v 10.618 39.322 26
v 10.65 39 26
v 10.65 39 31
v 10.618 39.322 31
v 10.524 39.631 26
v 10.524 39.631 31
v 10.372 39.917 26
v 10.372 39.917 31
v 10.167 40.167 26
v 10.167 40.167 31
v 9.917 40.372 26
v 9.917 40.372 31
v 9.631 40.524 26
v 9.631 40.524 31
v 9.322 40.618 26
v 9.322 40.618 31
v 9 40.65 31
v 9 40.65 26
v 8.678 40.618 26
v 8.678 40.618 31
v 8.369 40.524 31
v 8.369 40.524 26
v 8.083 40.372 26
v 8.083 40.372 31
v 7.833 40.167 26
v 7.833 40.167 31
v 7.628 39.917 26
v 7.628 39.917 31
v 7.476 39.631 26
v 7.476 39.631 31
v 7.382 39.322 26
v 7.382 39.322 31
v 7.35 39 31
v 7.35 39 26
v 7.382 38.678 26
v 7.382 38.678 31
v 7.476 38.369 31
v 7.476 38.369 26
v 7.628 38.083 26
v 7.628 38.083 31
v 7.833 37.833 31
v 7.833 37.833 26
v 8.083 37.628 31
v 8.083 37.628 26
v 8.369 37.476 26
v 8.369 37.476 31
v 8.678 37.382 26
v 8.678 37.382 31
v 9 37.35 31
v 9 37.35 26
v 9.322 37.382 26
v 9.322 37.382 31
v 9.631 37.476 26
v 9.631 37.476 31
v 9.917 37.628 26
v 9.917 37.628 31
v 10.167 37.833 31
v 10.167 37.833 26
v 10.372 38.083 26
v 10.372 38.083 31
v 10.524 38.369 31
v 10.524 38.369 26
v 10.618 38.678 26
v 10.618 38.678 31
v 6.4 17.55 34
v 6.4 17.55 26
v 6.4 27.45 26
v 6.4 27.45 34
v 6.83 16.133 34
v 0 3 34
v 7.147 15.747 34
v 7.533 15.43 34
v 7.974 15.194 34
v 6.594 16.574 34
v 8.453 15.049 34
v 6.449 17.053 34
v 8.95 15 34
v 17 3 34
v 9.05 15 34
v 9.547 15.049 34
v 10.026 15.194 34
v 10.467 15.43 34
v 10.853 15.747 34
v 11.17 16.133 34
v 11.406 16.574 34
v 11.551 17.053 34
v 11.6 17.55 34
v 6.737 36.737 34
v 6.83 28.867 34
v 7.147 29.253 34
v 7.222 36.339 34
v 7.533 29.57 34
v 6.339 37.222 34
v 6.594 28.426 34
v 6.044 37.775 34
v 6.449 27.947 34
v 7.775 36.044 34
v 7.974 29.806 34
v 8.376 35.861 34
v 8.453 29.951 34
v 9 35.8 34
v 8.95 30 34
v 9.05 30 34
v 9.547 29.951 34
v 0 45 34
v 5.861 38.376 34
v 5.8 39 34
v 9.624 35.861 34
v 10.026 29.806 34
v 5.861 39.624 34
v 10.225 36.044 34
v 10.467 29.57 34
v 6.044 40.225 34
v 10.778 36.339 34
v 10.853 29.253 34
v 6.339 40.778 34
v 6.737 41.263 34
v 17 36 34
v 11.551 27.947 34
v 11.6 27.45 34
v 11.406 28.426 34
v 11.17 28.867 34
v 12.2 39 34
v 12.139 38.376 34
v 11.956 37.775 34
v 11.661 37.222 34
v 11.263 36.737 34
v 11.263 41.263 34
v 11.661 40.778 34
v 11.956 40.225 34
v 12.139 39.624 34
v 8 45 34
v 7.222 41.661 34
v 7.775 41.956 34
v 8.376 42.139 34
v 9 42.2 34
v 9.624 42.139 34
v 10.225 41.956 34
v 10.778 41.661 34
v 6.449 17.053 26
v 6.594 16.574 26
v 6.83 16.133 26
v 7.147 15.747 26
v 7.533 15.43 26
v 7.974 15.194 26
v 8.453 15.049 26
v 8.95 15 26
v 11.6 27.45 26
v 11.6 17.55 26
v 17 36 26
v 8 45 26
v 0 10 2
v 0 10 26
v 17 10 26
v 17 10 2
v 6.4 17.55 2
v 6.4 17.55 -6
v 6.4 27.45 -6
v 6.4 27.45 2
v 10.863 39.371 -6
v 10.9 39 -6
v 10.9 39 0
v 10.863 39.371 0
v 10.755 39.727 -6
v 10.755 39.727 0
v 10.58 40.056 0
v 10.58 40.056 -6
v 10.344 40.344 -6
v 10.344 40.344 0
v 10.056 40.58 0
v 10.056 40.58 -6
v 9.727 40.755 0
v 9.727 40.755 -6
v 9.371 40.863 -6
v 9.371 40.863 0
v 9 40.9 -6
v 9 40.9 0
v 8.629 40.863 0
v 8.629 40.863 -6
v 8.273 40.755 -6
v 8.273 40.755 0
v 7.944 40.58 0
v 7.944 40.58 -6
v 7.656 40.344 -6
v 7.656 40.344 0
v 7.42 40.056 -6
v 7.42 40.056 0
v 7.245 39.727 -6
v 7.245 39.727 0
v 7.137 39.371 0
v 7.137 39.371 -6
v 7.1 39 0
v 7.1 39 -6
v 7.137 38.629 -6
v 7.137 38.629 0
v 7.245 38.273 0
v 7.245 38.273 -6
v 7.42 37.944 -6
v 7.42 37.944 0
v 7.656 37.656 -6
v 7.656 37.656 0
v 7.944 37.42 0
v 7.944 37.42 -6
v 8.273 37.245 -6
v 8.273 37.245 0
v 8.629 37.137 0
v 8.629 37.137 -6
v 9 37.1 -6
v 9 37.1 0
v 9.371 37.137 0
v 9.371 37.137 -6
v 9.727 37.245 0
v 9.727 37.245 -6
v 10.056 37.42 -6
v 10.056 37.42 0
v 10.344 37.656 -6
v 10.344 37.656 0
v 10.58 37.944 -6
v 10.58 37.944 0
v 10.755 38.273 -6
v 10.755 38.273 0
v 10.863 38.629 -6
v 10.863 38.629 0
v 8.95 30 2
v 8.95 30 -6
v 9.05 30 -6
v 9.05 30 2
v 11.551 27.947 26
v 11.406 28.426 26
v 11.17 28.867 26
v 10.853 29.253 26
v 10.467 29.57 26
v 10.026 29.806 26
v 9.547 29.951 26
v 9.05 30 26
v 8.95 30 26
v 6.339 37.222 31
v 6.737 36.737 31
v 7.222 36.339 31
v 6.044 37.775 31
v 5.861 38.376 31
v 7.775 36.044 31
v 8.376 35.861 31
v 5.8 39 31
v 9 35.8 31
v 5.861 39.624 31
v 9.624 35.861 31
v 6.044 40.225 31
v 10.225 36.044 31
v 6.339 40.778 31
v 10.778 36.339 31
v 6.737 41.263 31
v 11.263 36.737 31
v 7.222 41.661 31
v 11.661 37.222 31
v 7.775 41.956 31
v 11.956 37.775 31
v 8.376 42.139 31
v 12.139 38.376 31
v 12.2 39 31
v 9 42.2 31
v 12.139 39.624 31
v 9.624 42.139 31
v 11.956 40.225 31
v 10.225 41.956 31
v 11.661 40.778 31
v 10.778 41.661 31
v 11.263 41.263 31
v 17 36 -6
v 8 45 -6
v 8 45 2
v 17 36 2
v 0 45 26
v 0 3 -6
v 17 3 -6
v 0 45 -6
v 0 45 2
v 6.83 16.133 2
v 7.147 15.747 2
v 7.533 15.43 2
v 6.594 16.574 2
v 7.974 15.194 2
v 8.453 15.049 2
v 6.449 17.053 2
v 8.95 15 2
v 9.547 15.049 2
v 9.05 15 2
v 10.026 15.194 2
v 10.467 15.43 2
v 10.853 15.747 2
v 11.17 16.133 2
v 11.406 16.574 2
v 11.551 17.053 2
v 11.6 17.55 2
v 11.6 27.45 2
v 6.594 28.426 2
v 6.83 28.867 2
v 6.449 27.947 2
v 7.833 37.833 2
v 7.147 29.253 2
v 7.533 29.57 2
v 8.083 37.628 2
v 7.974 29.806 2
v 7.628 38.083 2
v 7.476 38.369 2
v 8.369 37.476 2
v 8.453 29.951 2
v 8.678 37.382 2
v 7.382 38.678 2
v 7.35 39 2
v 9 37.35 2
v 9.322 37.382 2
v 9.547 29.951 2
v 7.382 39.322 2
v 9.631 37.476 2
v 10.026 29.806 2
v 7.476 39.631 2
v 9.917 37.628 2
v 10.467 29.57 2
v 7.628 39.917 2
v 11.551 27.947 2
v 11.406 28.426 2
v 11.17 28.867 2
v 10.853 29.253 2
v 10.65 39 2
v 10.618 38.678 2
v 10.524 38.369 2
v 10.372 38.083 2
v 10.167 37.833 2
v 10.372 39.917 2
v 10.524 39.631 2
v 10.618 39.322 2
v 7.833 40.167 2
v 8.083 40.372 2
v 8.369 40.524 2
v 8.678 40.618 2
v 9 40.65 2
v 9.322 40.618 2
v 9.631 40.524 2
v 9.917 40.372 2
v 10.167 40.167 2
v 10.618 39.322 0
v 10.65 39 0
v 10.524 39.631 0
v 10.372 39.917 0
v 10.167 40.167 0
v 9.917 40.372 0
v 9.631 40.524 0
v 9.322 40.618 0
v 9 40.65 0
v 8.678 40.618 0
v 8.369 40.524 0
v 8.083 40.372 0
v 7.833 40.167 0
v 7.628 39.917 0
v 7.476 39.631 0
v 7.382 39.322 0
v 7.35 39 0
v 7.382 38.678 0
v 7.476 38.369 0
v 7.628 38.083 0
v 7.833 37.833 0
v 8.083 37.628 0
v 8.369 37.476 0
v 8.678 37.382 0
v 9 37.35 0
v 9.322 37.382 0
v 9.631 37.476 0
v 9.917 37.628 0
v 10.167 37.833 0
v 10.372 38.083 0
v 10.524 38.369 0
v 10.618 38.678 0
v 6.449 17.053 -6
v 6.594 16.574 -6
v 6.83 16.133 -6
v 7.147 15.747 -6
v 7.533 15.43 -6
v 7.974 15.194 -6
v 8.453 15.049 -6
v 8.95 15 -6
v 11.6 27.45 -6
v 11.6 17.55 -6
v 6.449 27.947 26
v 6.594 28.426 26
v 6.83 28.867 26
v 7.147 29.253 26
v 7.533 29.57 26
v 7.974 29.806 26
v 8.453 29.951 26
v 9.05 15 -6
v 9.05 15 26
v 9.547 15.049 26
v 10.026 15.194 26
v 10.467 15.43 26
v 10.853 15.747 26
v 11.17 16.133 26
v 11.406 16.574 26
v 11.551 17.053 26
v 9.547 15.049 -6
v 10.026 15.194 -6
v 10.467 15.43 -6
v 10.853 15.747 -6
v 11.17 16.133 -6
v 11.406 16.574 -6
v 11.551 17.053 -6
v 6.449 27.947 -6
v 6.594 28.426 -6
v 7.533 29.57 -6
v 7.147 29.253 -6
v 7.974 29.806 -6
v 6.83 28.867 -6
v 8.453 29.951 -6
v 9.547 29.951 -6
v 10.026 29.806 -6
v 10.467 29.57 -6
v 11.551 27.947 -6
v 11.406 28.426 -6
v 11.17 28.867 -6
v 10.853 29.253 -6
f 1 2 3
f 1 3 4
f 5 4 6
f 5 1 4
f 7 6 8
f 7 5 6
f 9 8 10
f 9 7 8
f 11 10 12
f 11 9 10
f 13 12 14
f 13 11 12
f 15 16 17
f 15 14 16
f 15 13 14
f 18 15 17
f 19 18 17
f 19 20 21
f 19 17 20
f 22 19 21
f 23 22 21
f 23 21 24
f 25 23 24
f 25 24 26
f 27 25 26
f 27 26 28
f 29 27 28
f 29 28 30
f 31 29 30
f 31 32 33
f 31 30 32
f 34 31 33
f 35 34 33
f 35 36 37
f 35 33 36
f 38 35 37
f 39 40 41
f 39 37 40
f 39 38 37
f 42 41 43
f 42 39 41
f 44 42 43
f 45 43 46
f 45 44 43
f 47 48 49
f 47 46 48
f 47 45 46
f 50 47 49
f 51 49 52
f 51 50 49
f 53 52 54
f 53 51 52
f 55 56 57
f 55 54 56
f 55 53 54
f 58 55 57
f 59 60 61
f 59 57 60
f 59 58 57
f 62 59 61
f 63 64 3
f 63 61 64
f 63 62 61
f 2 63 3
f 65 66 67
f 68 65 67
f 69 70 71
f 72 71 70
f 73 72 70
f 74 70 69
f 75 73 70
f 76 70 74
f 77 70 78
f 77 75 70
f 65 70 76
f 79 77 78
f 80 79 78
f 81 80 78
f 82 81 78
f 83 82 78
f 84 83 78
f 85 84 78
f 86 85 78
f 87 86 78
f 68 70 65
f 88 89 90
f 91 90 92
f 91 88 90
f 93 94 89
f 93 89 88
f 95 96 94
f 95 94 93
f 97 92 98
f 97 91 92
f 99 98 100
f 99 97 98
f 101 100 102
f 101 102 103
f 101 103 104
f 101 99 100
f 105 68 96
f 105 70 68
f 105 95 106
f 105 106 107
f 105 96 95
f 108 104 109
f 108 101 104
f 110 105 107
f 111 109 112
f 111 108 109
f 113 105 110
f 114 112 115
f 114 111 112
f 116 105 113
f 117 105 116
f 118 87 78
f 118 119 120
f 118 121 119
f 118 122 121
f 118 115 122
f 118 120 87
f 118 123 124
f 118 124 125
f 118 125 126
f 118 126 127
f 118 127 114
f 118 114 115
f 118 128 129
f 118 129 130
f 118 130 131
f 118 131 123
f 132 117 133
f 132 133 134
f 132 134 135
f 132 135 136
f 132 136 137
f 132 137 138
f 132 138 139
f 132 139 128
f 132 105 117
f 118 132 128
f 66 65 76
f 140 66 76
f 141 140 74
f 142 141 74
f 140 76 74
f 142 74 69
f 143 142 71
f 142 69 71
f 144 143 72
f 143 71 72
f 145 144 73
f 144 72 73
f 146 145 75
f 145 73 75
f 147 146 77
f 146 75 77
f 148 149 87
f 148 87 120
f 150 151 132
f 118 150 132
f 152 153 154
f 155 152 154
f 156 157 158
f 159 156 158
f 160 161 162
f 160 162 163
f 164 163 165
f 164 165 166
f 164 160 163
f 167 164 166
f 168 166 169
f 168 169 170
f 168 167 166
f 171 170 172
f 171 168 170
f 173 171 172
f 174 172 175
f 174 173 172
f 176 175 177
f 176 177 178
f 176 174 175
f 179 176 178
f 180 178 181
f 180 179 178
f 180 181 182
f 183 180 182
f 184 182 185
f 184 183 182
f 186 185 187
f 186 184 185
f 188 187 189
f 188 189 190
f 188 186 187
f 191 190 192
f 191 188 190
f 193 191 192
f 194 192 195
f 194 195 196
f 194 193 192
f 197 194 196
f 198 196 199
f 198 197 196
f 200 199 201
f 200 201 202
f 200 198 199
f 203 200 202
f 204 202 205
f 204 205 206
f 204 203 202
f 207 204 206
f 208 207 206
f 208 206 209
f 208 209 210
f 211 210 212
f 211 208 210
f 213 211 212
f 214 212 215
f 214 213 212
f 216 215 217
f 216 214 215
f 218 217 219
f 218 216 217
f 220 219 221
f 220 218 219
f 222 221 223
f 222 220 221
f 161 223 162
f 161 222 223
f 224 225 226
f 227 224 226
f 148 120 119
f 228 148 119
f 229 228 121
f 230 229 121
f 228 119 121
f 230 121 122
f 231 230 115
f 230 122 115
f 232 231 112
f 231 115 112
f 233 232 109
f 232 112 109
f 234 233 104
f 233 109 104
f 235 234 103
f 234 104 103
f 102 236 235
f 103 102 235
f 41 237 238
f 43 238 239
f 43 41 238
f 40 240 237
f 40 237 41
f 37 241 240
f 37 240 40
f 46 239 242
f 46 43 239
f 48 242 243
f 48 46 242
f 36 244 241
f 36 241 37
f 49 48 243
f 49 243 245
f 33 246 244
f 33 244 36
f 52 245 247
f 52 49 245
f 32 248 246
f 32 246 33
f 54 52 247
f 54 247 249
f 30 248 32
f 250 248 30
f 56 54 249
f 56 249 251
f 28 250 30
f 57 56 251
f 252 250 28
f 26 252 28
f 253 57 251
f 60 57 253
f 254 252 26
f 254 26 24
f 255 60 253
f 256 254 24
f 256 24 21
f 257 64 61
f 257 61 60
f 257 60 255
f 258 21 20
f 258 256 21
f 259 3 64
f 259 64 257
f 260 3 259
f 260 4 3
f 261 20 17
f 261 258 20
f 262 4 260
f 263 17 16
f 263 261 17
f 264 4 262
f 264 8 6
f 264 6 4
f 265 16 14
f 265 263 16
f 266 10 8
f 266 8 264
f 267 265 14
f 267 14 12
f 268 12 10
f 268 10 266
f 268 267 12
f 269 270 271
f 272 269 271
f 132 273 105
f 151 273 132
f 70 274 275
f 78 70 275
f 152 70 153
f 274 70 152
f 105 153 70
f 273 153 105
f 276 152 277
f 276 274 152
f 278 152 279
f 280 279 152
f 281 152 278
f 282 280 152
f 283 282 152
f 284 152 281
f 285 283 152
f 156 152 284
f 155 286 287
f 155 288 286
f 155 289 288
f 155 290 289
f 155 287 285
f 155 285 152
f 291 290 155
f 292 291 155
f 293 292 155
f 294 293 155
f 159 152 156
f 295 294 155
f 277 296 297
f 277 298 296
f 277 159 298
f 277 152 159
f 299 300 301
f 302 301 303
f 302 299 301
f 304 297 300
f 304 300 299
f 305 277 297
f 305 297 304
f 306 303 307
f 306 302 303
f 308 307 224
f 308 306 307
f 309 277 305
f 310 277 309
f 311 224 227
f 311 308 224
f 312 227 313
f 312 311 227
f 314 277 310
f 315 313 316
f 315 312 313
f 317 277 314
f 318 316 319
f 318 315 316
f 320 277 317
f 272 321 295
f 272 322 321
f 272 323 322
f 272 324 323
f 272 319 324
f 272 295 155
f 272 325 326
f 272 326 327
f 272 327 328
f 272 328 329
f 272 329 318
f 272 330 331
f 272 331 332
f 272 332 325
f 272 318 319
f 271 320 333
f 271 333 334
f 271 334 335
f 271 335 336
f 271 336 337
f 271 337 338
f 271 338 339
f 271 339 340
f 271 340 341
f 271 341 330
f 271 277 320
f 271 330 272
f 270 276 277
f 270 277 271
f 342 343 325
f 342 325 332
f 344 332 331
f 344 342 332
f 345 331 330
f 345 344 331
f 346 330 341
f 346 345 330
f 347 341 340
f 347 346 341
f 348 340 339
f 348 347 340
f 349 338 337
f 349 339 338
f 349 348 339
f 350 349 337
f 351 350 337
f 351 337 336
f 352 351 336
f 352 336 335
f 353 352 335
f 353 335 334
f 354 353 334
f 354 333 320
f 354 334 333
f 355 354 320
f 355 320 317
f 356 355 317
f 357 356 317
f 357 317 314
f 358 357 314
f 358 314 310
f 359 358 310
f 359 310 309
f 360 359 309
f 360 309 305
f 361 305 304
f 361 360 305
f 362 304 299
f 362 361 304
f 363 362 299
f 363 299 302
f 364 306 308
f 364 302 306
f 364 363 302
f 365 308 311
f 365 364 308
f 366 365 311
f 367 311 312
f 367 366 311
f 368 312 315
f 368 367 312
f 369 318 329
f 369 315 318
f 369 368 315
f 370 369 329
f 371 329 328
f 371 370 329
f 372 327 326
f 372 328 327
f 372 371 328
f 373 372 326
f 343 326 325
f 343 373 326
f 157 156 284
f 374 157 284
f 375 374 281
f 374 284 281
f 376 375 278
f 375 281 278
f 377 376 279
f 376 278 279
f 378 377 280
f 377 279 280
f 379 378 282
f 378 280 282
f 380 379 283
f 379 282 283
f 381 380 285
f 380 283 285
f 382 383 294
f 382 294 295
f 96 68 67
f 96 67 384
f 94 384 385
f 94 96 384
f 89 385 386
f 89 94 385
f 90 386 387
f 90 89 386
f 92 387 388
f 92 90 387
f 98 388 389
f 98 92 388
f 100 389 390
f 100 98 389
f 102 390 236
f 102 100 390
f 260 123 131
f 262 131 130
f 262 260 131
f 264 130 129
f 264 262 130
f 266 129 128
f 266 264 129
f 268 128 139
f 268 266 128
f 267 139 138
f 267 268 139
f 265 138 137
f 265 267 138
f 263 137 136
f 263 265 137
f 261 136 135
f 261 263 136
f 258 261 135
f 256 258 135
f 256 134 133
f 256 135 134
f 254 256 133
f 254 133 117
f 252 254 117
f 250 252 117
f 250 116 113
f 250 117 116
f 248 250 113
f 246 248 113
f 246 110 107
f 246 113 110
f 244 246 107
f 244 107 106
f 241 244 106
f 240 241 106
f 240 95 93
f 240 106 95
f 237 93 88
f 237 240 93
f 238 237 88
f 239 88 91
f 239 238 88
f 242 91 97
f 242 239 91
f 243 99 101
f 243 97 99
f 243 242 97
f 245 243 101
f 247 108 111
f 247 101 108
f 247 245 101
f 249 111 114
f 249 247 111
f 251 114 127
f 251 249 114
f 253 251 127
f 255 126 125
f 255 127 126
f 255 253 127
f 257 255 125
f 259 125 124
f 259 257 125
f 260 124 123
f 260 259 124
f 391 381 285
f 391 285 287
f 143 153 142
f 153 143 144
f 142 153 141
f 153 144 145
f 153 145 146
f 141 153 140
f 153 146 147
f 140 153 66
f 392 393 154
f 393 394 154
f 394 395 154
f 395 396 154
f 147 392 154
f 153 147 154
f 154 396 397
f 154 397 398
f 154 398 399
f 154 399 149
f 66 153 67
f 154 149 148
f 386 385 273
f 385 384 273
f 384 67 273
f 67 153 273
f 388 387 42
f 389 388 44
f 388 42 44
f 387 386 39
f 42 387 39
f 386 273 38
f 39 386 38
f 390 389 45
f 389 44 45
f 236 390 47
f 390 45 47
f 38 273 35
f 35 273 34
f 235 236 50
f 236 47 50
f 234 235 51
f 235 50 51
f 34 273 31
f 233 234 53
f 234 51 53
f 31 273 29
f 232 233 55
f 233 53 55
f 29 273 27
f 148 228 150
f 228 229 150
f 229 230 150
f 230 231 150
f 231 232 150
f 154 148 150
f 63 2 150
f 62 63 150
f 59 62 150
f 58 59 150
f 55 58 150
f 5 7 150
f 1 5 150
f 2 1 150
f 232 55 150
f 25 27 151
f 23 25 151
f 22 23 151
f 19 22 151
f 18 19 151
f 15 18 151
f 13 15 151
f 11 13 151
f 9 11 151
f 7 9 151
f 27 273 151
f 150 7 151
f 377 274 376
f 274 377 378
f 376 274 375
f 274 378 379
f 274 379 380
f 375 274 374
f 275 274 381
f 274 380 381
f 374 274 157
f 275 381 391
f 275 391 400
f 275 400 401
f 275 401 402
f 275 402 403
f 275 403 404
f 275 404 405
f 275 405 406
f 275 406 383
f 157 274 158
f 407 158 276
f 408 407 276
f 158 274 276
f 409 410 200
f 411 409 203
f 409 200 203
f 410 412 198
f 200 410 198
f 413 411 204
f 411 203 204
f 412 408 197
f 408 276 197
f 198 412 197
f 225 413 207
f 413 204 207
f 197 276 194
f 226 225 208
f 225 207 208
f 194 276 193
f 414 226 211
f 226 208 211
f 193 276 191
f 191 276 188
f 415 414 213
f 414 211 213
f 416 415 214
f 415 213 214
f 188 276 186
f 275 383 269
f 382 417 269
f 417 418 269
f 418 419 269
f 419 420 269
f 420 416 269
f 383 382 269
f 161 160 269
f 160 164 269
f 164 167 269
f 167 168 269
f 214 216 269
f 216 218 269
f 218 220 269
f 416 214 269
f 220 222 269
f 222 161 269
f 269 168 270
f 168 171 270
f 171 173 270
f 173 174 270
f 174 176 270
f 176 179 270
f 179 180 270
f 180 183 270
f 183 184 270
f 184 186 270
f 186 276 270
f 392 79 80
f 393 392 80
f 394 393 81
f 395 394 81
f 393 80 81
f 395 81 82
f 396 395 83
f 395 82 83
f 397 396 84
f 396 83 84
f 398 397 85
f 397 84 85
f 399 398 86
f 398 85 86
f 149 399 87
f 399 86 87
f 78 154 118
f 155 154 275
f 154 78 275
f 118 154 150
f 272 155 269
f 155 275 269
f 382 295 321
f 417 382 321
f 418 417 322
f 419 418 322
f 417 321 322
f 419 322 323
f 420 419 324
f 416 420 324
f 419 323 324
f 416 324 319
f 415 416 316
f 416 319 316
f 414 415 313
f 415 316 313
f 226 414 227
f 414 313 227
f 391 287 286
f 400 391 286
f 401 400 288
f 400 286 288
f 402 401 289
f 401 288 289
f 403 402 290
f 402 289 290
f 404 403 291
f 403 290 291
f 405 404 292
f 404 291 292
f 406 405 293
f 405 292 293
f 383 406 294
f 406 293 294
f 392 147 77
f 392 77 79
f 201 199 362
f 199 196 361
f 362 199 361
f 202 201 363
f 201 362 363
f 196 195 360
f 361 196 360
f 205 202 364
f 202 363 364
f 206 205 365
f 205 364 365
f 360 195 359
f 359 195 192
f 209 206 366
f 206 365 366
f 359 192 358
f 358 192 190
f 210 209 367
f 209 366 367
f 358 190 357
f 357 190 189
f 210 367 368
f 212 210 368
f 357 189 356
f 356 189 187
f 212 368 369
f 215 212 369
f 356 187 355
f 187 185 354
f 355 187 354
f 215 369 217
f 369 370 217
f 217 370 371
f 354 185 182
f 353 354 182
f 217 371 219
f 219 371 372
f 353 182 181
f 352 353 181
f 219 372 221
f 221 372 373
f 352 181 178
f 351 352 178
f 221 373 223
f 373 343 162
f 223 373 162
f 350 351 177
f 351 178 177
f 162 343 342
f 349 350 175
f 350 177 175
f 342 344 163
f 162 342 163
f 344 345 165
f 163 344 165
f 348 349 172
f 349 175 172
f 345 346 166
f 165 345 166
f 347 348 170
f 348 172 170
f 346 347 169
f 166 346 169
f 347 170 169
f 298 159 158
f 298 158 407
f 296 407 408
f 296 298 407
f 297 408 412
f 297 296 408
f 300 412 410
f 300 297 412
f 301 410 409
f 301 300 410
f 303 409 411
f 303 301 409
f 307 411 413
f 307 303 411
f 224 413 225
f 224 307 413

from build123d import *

# Parameters (mm, degrees)
BOX014_W              = 5.2
BOX014_H              = 15
BOX014_DEPTH          = 67
FILLET001_R           = 2.55
BOX021_W              = 17
BOX021_H              = 40
BOX021_DEPTH          = 24
CYLINDER005_R         = 3.2
CYLINDER005_DEPTH     = 4
CYLINDER007_R         = 1.9
CYLINDER007_DEPTH     = 6
CYLINDER006_R         = 1.65
CYLINDER006_DEPTH     = 54
BOX006_W              = 17
BOX006_H              = 42
BOX006_DEPTH          = 40
CHAMFER020026003_SIZE = 9


with BuildPart() as fillet001:
    # Box014 → Box014 (new body)
    with BuildSketch(Plane(origin=(6.4, 15, -6), x_dir=(1, 0, 0), z_dir=(0, 0, 1))):
        with Locations((2.6, 7.5)):
            Rectangle(BOX014_W, BOX014_H)
    extrude(amount=BOX014_DEPTH)

    # Fillet001
    fillet001_edges = [fillet001.edges().sort_by_distance(p)[0] for p in [
        (6.4, 15, 27.5),
        (6.4, 30, 27.5),
        (11.6, 15, 27.5),
        (11.6, 30, 27.5),
    ]]
    fillet(fillet001_edges, radius=FILLET001_R)


with BuildPart() as cube021:
    # Box021 → Box021 (new body)
    with BuildSketch(Plane(origin=(0, 10, 2), x_dir=(1, 0, 0), z_dir=(0, 0, 1))):
        with Locations((8.5, 20)):
            Rectangle(BOX021_W, BOX021_H)
    extrude(amount=BOX021_DEPTH)


with BuildPart() as cylinder005:
    # Cylinder005 → Cylinder005 (new body)
    with BuildSketch(Plane(origin=(9, 39, 31), x_dir=(1, 0, 0), z_dir=(0, 0, 1))):
        Circle(CYLINDER005_R)
    extrude(amount=CYLINDER005_DEPTH)


with BuildPart() as cylinder007:
    # Cylinder007 → Cylinder007 (new body)
    with BuildSketch(Plane(origin=(9, 39, -6), x_dir=(1, 0, 0), z_dir=(0, 0, 1))):
        Circle(CYLINDER007_R)
    extrude(amount=CYLINDER007_DEPTH)


with BuildPart() as cylinder006:
    # Cylinder006 → Cylinder006 (new body)
    with BuildSketch(Plane(origin=(9, 39, -12), x_dir=(1, 0, 0), z_dir=(0, 0, 1))):
        Circle(CYLINDER006_R)
    extrude(amount=CYLINDER006_DEPTH)


with BuildPart() as cut002002002007004004001006016:
    # Box006 → Box006 (new body)
    with BuildSketch(Plane(origin=(0, 3, -6), x_dir=(1, 0, 0), z_dir=(0, 0, 1))):
        with Locations((8.5, 21)):
            Rectangle(BOX006_W, BOX006_H)
    extrude(amount=BOX006_DEPTH)

    # Chamfer020026003
    chamfer020026003_edges = [cut002002002007004004001006016.edges().sort_by_distance(p)[0] for p in [
        (17, 45, 14),
    ]]
    chamfer(chamfer020026003_edges, length=CHAMFER020026003_SIZE)

    # Cut002002002007004004001006009: cut Cylinder006
    add(cylinder006.part, mode=Mode.SUBTRACT)

    # Cut002002002007004004001006010: cut Cylinder007
    add(cylinder007.part, mode=Mode.SUBTRACT)

    # Cut002002002007004004001006011: cut Cylinder005
    add(cylinder005.part, mode=Mode.SUBTRACT)

    # Cut002002002007004004001006012: cut Cube021
    add(cube021.part, mode=Mode.SUBTRACT)

    # Cut002002002007004004001006016: cut Fillet001
    add(fillet001.part, mode=Mode.SUBTRACT)


solid = cut002002002007004004001006016.part
